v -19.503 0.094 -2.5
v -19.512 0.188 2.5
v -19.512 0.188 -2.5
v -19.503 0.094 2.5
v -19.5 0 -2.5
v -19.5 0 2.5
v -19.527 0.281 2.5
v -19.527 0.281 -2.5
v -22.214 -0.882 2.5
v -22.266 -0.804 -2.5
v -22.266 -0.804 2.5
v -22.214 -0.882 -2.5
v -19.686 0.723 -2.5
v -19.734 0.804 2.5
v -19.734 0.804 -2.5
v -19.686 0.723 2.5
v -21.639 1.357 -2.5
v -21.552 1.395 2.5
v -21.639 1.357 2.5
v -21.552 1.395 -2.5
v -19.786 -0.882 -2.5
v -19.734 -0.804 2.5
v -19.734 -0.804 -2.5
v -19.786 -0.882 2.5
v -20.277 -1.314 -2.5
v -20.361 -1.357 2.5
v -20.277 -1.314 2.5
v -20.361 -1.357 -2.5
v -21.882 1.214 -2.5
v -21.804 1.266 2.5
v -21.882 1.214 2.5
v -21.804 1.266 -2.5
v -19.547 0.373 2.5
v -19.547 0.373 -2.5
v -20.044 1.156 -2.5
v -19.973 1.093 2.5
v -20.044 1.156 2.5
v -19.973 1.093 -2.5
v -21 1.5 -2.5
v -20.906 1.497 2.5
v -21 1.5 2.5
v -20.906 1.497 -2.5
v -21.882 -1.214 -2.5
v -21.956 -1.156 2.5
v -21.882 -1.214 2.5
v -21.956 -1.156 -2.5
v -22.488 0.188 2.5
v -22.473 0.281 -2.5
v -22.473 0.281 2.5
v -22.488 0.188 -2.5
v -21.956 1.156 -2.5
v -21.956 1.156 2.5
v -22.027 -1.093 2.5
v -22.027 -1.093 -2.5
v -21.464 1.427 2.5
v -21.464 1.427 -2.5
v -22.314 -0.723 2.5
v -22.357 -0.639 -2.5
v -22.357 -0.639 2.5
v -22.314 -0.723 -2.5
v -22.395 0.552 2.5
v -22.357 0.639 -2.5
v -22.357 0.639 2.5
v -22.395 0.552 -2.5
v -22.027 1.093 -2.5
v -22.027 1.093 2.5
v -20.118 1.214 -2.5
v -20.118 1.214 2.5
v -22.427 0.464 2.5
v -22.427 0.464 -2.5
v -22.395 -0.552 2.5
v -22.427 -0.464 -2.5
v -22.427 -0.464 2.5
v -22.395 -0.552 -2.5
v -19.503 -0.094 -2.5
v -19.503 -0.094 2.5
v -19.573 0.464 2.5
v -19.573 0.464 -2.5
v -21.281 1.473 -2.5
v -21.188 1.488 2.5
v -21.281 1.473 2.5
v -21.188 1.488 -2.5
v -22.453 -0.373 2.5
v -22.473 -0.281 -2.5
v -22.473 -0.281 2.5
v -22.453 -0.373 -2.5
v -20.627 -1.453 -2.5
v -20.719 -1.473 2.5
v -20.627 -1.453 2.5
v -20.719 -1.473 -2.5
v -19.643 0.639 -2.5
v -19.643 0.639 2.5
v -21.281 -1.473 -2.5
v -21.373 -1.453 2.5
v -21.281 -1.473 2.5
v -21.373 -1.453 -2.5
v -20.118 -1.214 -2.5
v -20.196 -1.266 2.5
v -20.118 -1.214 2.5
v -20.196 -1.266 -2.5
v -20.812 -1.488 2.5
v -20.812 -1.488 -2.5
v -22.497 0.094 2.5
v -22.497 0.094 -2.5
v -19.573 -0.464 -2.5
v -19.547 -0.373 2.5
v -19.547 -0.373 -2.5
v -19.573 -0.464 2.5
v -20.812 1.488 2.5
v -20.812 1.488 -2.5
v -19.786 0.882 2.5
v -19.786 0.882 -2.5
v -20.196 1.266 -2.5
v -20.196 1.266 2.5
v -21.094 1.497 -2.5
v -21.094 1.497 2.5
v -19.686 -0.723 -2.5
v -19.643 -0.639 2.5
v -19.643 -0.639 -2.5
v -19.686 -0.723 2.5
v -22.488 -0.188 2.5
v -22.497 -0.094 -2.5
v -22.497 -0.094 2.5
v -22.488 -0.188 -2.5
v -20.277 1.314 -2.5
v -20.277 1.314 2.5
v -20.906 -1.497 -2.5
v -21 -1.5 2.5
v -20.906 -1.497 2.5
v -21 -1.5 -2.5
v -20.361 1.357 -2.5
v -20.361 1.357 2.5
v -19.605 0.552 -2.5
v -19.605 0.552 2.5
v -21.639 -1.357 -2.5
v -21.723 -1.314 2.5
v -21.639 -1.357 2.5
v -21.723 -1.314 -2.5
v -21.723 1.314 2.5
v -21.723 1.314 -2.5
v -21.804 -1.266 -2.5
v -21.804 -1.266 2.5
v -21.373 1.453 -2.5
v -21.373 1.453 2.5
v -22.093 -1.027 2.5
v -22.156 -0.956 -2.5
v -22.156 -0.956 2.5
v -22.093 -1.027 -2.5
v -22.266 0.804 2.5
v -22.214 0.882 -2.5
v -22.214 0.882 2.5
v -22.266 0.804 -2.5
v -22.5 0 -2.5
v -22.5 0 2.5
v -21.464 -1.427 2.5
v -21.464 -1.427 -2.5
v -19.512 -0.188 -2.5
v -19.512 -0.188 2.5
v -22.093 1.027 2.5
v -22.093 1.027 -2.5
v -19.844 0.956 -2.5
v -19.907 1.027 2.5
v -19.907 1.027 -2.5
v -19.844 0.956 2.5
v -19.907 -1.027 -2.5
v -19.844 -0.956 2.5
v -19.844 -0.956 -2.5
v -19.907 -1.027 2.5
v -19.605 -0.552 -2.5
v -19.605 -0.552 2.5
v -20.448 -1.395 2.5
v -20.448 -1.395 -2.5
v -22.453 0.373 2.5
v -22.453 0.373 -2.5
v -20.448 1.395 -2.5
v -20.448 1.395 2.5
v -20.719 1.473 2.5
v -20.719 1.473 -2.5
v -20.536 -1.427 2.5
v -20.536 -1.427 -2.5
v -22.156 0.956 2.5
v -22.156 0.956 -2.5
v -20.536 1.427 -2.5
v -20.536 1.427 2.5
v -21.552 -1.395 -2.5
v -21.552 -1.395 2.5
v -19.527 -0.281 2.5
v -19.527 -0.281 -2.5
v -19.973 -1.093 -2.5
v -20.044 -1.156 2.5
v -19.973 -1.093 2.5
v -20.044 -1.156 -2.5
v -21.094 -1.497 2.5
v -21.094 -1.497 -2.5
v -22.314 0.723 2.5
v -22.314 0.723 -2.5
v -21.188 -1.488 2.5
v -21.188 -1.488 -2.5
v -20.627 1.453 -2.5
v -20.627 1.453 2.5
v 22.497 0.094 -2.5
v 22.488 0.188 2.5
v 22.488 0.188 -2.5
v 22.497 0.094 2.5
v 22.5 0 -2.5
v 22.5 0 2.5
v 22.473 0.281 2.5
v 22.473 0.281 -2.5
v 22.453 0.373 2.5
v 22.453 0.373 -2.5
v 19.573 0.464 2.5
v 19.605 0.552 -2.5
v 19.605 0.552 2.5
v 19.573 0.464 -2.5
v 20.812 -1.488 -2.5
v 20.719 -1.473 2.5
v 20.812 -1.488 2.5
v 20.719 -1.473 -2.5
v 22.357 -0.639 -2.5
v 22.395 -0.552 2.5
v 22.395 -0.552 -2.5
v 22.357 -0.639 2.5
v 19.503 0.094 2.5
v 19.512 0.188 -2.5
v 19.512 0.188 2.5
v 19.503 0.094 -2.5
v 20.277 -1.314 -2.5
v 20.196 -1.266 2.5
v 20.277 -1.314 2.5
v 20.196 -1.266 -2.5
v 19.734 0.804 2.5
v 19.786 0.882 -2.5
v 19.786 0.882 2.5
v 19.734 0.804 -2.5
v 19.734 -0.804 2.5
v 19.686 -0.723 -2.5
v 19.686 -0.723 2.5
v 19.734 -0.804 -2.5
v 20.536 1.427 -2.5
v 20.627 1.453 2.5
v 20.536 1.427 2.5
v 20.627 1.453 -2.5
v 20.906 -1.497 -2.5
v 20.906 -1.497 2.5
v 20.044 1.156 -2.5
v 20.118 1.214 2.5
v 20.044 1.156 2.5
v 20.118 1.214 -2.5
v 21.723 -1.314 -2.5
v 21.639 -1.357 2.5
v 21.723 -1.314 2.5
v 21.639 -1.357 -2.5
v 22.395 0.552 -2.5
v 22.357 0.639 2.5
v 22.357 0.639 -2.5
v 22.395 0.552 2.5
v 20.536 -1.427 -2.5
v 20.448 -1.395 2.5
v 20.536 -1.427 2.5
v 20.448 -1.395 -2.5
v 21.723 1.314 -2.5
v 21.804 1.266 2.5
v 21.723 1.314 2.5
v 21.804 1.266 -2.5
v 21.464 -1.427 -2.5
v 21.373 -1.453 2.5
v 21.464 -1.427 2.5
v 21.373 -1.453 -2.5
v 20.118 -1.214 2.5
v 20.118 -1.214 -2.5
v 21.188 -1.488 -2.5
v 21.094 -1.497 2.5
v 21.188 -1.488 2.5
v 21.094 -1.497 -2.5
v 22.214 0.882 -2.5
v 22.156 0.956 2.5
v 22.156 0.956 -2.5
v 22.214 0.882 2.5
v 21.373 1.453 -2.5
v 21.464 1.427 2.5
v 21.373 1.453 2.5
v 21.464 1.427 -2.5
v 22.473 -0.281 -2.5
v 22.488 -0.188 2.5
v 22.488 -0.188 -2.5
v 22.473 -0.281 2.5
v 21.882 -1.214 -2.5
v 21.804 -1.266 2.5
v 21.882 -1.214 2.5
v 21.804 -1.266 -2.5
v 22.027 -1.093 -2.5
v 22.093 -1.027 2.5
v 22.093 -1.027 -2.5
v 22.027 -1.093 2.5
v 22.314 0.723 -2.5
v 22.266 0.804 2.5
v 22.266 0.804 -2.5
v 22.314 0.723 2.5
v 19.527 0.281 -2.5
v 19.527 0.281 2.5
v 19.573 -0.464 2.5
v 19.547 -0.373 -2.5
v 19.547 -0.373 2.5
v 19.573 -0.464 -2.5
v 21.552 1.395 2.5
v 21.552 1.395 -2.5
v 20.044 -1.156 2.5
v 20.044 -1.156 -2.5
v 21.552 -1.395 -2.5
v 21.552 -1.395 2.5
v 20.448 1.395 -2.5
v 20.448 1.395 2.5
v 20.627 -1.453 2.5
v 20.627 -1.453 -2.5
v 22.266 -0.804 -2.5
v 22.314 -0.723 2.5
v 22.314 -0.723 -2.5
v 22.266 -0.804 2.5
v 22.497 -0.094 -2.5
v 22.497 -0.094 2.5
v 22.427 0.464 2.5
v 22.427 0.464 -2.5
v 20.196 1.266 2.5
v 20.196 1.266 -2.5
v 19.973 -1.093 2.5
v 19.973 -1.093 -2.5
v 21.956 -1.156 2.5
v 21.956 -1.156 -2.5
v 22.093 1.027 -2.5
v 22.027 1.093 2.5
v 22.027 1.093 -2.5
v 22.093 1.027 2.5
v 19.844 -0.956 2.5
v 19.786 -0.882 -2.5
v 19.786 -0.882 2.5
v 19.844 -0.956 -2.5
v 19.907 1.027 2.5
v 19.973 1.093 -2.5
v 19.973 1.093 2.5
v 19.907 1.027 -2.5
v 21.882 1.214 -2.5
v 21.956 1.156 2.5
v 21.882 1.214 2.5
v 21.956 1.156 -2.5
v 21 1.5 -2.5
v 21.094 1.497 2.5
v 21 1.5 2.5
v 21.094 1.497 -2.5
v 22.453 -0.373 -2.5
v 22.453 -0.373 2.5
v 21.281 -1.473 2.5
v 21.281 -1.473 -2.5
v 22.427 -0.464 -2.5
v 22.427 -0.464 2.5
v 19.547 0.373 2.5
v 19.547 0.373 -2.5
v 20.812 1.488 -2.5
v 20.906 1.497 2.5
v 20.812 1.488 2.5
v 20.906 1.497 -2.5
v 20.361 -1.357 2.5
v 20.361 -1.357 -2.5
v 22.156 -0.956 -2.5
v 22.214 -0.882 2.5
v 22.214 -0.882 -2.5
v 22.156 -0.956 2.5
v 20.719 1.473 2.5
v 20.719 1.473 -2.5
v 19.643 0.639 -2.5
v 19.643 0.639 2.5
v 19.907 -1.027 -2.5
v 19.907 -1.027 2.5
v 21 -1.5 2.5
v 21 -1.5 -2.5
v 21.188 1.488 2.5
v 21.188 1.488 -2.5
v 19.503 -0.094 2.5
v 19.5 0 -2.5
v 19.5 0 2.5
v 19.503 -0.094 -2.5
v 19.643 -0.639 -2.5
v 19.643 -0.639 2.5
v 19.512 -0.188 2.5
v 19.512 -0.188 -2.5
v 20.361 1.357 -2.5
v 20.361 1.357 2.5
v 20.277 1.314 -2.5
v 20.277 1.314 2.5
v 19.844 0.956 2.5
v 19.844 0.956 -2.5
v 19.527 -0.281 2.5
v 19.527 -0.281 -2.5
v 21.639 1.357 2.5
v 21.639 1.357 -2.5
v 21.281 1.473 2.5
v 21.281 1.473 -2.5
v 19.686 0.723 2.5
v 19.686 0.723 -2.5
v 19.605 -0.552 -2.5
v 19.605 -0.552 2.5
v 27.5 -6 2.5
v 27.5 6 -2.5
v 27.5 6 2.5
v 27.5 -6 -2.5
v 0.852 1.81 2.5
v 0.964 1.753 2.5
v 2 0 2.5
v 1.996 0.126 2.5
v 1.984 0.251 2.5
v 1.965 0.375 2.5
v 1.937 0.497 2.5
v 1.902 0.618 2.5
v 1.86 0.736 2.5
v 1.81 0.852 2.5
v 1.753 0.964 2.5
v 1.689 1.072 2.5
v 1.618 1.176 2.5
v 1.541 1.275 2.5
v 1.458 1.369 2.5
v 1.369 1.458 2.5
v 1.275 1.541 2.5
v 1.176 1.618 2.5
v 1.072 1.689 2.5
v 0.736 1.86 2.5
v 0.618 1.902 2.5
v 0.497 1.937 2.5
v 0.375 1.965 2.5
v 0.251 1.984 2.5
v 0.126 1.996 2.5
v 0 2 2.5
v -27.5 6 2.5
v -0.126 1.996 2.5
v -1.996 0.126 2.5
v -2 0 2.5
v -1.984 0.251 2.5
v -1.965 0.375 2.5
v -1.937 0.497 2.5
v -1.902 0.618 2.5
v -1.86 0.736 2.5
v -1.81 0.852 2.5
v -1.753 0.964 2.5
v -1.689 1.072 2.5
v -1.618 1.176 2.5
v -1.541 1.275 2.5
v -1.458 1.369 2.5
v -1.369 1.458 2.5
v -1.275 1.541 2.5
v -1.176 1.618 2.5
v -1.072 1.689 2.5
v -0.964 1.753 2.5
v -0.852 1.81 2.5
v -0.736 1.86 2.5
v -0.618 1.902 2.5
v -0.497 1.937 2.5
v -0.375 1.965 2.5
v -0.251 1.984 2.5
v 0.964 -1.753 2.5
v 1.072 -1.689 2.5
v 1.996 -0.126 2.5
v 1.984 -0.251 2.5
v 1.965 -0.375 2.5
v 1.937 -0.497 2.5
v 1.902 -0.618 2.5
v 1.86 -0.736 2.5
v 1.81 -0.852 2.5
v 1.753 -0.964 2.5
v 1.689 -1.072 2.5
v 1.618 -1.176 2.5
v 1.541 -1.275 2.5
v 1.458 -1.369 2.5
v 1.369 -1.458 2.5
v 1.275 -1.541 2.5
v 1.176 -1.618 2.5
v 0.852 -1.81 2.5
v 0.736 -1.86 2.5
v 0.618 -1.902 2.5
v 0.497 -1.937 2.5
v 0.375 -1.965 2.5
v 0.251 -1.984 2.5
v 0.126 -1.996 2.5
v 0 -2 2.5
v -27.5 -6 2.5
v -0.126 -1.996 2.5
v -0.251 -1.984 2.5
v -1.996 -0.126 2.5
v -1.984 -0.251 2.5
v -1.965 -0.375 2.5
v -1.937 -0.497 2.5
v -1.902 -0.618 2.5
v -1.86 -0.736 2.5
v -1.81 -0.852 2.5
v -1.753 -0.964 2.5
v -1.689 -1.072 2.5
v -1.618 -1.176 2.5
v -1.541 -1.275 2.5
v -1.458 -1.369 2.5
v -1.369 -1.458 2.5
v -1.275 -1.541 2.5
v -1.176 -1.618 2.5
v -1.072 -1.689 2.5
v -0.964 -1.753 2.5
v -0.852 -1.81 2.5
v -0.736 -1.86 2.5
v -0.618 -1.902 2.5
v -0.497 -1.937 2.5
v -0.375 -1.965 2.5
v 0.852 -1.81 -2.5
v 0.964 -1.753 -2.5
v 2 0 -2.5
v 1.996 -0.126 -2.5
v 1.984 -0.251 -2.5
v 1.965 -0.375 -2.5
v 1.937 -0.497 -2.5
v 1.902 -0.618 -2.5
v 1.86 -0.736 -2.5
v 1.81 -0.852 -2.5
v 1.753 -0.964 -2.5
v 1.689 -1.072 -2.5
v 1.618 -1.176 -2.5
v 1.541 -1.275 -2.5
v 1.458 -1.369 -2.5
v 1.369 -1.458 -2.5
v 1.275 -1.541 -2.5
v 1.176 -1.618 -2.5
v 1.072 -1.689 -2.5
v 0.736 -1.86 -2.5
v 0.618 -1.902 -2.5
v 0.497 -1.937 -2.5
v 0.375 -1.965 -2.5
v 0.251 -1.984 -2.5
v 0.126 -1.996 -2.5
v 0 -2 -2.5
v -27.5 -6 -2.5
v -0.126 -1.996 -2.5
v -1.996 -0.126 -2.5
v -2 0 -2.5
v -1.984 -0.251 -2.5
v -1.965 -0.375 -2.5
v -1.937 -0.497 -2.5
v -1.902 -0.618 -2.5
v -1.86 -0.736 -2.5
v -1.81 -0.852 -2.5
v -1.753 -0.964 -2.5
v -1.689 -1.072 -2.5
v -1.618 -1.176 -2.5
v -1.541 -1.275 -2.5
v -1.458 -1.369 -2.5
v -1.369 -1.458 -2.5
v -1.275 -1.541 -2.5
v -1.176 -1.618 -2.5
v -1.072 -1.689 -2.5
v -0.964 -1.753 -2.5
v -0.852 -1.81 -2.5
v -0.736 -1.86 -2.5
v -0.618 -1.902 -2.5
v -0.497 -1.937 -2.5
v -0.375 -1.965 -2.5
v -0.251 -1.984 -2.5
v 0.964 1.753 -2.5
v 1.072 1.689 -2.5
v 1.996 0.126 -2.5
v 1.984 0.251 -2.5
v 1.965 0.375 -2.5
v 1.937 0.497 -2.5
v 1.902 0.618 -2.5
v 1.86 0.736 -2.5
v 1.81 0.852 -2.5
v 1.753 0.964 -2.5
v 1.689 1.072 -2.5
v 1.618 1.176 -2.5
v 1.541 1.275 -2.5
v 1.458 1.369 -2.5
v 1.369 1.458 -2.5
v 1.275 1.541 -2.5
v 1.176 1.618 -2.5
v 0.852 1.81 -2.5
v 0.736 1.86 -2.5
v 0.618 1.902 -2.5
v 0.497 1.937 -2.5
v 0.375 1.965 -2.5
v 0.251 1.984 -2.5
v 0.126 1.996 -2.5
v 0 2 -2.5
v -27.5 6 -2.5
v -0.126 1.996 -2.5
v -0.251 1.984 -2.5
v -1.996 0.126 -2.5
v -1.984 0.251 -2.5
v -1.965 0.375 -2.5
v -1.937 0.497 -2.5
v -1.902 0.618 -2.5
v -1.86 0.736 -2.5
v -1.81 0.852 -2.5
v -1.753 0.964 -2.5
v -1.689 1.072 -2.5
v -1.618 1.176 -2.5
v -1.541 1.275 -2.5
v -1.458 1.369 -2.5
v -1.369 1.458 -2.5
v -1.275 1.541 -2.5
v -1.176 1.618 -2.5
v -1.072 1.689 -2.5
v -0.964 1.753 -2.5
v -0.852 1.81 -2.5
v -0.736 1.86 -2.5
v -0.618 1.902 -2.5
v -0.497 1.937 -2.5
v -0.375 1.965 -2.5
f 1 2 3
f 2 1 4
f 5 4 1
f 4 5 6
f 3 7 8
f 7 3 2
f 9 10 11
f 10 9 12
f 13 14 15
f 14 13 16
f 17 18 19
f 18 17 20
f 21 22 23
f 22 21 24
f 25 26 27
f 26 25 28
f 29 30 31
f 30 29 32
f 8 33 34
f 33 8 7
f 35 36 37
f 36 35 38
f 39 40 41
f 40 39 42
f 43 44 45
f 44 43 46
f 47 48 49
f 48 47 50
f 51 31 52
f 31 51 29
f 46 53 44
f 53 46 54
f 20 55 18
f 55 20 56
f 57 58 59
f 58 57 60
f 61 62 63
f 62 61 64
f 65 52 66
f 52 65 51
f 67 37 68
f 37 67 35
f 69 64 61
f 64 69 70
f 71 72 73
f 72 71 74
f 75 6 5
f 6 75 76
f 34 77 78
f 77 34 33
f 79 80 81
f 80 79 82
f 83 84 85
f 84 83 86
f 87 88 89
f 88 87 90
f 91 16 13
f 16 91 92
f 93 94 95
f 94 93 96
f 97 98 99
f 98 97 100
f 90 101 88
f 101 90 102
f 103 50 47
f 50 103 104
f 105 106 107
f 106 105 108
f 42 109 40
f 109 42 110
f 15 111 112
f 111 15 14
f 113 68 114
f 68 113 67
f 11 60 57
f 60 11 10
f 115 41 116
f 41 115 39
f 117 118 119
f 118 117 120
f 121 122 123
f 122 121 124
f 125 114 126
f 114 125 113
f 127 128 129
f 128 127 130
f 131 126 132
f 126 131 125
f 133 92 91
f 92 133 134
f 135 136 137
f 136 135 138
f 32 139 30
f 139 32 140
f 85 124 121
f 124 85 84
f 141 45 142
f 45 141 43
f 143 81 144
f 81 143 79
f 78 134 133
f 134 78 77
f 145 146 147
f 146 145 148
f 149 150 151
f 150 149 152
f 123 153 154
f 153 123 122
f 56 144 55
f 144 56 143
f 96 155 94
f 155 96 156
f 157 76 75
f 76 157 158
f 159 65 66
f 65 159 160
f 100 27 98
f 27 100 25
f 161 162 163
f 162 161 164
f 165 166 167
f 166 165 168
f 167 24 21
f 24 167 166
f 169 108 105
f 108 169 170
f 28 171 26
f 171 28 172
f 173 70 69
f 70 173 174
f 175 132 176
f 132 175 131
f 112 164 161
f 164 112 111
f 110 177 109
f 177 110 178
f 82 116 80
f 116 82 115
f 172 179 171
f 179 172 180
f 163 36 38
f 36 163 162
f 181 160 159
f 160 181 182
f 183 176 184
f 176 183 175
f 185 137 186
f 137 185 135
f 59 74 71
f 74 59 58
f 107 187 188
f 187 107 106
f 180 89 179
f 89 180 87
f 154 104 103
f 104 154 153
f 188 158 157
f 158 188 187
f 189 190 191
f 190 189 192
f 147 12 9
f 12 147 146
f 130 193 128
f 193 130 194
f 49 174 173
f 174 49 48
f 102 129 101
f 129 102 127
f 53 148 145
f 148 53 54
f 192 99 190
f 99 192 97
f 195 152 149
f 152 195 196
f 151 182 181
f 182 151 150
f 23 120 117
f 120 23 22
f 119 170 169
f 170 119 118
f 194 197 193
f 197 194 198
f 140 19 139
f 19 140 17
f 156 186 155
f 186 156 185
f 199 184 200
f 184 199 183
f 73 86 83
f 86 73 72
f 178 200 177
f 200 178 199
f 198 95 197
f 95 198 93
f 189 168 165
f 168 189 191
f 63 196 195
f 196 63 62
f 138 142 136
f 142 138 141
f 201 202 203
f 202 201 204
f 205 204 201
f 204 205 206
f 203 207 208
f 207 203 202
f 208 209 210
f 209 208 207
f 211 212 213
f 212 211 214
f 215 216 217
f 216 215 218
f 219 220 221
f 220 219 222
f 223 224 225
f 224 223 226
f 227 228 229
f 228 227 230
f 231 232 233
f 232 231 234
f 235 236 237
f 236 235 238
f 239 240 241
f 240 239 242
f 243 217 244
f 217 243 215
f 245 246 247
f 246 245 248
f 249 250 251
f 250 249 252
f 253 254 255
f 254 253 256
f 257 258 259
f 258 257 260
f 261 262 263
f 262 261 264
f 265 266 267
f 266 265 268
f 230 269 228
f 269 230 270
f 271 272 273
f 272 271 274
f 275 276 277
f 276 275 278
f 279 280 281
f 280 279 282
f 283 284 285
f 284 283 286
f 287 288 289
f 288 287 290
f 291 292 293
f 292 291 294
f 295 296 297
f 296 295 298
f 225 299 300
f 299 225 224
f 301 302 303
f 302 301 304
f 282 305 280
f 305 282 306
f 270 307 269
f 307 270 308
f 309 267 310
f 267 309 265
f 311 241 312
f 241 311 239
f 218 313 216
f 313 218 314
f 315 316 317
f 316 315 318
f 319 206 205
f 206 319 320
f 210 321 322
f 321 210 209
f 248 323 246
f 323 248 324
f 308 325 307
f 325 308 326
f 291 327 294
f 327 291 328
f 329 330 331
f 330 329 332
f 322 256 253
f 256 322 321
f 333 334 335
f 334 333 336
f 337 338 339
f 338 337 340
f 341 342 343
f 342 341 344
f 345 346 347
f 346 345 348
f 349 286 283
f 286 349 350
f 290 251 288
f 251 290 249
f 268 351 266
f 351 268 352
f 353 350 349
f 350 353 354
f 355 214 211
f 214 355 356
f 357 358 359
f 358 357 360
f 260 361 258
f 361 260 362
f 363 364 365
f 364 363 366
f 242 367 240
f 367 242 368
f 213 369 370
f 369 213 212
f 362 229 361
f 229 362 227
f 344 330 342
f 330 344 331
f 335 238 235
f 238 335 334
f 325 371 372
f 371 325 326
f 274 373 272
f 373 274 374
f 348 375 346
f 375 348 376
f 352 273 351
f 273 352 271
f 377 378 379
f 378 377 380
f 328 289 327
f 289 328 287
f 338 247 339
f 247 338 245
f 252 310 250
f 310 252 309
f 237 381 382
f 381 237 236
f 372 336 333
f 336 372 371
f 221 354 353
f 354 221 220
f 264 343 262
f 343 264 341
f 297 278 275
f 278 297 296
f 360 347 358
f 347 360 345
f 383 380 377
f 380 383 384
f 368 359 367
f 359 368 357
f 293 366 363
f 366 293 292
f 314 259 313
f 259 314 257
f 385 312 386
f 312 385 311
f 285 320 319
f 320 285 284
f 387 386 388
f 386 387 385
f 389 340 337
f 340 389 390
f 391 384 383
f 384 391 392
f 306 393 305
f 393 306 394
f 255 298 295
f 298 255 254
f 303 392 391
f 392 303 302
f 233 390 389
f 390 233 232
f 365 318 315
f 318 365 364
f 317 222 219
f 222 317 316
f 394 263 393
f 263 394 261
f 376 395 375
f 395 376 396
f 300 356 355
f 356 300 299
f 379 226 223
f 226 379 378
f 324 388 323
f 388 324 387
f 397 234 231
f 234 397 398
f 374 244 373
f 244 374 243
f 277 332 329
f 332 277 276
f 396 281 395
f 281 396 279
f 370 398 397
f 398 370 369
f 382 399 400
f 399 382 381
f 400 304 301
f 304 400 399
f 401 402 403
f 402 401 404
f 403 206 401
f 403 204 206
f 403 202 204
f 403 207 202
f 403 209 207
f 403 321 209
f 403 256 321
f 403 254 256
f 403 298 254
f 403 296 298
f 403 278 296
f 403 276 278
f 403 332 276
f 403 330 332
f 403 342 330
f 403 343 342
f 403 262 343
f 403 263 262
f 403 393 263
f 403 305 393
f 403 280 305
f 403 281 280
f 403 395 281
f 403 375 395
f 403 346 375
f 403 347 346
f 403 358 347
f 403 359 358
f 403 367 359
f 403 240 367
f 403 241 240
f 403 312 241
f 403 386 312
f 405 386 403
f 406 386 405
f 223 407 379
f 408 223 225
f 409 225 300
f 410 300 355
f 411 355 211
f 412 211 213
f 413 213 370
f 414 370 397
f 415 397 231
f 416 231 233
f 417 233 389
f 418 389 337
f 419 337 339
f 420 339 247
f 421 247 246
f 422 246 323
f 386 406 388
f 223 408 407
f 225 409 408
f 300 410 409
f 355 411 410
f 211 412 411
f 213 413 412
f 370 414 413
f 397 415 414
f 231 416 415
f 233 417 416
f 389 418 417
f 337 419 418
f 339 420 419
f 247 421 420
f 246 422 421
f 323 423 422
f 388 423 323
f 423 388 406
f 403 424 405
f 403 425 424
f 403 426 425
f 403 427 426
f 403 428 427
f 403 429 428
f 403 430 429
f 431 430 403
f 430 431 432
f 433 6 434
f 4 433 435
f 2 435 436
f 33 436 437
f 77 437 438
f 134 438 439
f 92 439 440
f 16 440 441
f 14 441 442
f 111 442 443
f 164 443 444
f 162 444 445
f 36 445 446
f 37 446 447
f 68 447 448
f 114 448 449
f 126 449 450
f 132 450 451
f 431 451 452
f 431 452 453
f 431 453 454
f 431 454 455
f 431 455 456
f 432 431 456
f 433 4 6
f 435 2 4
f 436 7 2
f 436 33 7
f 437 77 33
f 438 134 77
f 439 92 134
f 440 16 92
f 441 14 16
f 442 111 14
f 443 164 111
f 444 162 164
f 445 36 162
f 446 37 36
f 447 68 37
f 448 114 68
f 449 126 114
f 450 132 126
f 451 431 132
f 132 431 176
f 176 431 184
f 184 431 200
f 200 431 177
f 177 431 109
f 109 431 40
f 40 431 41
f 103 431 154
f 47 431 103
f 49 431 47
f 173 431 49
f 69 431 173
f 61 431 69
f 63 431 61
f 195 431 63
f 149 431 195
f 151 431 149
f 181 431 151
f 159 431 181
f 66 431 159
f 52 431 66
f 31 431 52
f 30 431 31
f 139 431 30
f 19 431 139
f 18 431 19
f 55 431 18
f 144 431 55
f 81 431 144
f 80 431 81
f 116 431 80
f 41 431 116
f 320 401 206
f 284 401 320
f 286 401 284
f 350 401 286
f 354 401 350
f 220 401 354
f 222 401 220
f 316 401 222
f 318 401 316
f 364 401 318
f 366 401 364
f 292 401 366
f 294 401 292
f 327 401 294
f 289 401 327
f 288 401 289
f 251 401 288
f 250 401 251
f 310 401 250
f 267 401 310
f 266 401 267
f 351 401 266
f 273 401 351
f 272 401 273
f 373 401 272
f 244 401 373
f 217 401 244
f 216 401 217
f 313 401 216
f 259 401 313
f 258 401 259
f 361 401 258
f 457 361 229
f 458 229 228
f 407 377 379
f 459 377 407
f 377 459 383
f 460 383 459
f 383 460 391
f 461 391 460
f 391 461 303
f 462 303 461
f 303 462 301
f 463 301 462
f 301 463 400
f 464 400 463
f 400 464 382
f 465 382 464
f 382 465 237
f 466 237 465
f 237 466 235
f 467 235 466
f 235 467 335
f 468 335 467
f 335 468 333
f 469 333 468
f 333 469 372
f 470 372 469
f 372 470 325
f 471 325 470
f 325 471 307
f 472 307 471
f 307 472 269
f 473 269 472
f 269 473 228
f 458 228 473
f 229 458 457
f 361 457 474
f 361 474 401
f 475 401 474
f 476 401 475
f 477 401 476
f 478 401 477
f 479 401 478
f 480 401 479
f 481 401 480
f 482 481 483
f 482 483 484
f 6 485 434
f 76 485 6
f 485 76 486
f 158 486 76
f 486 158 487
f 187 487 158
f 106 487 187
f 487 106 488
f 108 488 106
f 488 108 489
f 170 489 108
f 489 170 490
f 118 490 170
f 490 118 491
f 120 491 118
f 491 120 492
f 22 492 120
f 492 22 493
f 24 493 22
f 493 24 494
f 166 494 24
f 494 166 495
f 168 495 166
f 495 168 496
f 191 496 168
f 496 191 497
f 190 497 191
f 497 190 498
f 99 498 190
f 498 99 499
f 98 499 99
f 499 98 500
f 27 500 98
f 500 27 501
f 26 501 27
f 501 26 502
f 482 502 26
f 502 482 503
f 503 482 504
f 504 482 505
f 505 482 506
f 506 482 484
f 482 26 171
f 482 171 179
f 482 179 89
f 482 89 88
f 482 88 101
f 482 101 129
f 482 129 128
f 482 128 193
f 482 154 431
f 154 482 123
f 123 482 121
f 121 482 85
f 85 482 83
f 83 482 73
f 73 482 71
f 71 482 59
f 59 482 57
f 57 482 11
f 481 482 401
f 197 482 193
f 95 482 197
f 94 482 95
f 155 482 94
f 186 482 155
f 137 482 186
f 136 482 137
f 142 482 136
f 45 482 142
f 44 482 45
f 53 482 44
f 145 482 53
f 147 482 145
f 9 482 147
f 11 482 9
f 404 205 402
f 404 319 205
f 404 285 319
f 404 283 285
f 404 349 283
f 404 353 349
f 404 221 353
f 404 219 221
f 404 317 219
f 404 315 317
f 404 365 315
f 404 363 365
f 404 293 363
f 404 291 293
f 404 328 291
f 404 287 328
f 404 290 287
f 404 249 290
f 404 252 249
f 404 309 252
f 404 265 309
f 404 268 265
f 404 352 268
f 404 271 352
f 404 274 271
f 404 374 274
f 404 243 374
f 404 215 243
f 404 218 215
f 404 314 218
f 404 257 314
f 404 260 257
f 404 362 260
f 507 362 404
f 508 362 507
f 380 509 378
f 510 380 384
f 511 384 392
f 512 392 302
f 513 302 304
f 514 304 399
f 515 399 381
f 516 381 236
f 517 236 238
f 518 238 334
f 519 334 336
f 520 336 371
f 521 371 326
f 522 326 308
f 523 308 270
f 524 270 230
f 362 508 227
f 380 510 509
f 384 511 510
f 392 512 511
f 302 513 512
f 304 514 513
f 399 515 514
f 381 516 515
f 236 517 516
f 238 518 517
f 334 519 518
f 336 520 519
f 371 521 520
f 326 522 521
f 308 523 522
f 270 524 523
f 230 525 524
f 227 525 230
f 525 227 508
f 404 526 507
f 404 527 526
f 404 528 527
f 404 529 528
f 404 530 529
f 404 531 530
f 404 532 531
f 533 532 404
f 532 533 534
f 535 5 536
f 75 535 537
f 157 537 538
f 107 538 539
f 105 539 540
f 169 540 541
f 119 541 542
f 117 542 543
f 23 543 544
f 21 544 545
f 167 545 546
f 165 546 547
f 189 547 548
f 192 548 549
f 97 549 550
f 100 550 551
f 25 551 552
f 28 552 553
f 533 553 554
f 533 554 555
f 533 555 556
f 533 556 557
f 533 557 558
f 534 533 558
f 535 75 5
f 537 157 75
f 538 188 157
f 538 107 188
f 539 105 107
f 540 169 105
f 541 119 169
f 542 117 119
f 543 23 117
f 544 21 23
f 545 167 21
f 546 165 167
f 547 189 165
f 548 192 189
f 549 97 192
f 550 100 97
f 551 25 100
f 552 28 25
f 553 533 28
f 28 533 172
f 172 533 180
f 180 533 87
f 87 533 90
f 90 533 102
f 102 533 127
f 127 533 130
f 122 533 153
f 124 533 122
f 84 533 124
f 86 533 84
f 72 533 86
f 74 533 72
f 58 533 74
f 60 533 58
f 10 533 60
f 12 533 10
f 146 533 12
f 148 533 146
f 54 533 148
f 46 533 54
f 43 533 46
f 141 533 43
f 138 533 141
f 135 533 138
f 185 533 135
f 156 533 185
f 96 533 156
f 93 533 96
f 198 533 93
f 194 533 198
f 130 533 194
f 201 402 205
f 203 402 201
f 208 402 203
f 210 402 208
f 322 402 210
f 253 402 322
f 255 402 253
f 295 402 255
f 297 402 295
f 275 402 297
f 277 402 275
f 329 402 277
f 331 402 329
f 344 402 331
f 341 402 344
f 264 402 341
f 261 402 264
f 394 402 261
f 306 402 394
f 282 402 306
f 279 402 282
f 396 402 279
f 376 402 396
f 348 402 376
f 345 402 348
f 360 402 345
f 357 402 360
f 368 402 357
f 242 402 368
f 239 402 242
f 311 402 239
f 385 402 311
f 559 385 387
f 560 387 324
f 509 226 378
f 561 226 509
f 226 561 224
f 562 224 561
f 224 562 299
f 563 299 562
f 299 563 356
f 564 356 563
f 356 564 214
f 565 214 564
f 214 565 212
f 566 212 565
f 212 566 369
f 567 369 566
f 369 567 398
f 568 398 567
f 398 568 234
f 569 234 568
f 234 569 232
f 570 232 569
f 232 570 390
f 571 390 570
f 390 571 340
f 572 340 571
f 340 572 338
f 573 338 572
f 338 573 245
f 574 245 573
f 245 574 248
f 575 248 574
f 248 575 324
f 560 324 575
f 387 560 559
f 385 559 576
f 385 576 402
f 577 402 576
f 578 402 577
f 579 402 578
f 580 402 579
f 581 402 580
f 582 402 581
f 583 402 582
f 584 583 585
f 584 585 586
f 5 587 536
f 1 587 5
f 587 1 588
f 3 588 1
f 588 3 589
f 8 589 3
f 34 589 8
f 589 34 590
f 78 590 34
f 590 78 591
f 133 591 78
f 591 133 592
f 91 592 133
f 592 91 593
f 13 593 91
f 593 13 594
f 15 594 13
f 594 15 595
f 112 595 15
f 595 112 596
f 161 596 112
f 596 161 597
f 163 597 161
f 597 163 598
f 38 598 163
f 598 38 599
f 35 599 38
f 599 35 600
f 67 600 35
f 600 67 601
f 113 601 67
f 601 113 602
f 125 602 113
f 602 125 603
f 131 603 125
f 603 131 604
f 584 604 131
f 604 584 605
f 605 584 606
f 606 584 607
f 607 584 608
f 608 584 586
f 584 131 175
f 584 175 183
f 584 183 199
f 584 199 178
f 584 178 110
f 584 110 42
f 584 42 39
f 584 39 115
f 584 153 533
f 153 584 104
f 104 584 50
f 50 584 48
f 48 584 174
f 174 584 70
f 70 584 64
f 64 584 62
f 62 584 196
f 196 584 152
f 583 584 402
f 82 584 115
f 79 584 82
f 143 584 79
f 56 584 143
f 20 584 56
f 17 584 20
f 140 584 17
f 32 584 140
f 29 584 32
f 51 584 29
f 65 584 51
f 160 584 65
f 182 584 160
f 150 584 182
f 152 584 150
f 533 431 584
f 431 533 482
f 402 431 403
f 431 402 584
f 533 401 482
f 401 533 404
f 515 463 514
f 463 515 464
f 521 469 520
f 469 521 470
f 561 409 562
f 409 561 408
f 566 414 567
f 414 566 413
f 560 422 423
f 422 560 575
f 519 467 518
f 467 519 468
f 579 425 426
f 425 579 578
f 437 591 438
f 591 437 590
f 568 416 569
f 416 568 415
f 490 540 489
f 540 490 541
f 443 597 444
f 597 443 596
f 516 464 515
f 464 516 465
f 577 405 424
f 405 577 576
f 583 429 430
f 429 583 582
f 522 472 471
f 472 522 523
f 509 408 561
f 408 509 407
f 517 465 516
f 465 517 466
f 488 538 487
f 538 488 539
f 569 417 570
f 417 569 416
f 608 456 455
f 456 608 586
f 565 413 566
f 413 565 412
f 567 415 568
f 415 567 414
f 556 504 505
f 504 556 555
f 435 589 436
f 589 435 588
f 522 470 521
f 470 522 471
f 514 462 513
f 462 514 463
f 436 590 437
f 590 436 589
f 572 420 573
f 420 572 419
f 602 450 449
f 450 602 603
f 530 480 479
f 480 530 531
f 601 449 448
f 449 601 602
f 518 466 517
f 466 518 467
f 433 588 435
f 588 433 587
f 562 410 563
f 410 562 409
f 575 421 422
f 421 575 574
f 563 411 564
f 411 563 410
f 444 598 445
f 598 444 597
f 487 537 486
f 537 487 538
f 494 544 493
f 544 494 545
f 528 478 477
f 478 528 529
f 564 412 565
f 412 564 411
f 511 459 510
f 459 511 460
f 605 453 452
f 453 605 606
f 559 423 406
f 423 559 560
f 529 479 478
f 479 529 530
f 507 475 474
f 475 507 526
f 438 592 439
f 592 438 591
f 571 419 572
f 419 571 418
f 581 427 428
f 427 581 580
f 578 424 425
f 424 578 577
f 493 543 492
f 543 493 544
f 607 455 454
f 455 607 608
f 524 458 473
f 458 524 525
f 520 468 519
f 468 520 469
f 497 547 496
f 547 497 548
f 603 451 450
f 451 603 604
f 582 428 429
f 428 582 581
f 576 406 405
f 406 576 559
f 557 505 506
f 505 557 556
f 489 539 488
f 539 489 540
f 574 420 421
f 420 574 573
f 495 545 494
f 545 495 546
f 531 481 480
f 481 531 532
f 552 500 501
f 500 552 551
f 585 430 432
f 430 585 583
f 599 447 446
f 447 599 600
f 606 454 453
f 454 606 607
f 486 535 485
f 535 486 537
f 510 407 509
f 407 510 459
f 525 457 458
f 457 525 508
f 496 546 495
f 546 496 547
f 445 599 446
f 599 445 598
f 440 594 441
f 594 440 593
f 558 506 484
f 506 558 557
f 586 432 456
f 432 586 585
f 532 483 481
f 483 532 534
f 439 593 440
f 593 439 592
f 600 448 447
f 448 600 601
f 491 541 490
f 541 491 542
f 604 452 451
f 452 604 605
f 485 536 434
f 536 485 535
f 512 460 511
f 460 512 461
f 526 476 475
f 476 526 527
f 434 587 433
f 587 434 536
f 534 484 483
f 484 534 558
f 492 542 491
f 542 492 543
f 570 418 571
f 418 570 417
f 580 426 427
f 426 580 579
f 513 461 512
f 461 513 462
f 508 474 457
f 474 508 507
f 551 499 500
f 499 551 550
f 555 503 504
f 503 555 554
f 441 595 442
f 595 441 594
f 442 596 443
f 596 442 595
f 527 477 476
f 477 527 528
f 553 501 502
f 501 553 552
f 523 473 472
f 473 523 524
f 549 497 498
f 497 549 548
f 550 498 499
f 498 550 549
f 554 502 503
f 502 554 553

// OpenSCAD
// From the middle of the extrusion to the middle of the lead screw is 30.

// Take away 10 for the extrusion
// Take away 15 for the bearing height
// That leaves 5

difference() {
    cube([55, 12, 5], center=true);
    cylinder(d=4, h=100, center=true, $fn=100);
    for (side = [-1, 1]) {
        translate([side*21, 0, 0]) {
            cylinder(d=3, h=100, center=true, $fn=100);
        }
    }
}
